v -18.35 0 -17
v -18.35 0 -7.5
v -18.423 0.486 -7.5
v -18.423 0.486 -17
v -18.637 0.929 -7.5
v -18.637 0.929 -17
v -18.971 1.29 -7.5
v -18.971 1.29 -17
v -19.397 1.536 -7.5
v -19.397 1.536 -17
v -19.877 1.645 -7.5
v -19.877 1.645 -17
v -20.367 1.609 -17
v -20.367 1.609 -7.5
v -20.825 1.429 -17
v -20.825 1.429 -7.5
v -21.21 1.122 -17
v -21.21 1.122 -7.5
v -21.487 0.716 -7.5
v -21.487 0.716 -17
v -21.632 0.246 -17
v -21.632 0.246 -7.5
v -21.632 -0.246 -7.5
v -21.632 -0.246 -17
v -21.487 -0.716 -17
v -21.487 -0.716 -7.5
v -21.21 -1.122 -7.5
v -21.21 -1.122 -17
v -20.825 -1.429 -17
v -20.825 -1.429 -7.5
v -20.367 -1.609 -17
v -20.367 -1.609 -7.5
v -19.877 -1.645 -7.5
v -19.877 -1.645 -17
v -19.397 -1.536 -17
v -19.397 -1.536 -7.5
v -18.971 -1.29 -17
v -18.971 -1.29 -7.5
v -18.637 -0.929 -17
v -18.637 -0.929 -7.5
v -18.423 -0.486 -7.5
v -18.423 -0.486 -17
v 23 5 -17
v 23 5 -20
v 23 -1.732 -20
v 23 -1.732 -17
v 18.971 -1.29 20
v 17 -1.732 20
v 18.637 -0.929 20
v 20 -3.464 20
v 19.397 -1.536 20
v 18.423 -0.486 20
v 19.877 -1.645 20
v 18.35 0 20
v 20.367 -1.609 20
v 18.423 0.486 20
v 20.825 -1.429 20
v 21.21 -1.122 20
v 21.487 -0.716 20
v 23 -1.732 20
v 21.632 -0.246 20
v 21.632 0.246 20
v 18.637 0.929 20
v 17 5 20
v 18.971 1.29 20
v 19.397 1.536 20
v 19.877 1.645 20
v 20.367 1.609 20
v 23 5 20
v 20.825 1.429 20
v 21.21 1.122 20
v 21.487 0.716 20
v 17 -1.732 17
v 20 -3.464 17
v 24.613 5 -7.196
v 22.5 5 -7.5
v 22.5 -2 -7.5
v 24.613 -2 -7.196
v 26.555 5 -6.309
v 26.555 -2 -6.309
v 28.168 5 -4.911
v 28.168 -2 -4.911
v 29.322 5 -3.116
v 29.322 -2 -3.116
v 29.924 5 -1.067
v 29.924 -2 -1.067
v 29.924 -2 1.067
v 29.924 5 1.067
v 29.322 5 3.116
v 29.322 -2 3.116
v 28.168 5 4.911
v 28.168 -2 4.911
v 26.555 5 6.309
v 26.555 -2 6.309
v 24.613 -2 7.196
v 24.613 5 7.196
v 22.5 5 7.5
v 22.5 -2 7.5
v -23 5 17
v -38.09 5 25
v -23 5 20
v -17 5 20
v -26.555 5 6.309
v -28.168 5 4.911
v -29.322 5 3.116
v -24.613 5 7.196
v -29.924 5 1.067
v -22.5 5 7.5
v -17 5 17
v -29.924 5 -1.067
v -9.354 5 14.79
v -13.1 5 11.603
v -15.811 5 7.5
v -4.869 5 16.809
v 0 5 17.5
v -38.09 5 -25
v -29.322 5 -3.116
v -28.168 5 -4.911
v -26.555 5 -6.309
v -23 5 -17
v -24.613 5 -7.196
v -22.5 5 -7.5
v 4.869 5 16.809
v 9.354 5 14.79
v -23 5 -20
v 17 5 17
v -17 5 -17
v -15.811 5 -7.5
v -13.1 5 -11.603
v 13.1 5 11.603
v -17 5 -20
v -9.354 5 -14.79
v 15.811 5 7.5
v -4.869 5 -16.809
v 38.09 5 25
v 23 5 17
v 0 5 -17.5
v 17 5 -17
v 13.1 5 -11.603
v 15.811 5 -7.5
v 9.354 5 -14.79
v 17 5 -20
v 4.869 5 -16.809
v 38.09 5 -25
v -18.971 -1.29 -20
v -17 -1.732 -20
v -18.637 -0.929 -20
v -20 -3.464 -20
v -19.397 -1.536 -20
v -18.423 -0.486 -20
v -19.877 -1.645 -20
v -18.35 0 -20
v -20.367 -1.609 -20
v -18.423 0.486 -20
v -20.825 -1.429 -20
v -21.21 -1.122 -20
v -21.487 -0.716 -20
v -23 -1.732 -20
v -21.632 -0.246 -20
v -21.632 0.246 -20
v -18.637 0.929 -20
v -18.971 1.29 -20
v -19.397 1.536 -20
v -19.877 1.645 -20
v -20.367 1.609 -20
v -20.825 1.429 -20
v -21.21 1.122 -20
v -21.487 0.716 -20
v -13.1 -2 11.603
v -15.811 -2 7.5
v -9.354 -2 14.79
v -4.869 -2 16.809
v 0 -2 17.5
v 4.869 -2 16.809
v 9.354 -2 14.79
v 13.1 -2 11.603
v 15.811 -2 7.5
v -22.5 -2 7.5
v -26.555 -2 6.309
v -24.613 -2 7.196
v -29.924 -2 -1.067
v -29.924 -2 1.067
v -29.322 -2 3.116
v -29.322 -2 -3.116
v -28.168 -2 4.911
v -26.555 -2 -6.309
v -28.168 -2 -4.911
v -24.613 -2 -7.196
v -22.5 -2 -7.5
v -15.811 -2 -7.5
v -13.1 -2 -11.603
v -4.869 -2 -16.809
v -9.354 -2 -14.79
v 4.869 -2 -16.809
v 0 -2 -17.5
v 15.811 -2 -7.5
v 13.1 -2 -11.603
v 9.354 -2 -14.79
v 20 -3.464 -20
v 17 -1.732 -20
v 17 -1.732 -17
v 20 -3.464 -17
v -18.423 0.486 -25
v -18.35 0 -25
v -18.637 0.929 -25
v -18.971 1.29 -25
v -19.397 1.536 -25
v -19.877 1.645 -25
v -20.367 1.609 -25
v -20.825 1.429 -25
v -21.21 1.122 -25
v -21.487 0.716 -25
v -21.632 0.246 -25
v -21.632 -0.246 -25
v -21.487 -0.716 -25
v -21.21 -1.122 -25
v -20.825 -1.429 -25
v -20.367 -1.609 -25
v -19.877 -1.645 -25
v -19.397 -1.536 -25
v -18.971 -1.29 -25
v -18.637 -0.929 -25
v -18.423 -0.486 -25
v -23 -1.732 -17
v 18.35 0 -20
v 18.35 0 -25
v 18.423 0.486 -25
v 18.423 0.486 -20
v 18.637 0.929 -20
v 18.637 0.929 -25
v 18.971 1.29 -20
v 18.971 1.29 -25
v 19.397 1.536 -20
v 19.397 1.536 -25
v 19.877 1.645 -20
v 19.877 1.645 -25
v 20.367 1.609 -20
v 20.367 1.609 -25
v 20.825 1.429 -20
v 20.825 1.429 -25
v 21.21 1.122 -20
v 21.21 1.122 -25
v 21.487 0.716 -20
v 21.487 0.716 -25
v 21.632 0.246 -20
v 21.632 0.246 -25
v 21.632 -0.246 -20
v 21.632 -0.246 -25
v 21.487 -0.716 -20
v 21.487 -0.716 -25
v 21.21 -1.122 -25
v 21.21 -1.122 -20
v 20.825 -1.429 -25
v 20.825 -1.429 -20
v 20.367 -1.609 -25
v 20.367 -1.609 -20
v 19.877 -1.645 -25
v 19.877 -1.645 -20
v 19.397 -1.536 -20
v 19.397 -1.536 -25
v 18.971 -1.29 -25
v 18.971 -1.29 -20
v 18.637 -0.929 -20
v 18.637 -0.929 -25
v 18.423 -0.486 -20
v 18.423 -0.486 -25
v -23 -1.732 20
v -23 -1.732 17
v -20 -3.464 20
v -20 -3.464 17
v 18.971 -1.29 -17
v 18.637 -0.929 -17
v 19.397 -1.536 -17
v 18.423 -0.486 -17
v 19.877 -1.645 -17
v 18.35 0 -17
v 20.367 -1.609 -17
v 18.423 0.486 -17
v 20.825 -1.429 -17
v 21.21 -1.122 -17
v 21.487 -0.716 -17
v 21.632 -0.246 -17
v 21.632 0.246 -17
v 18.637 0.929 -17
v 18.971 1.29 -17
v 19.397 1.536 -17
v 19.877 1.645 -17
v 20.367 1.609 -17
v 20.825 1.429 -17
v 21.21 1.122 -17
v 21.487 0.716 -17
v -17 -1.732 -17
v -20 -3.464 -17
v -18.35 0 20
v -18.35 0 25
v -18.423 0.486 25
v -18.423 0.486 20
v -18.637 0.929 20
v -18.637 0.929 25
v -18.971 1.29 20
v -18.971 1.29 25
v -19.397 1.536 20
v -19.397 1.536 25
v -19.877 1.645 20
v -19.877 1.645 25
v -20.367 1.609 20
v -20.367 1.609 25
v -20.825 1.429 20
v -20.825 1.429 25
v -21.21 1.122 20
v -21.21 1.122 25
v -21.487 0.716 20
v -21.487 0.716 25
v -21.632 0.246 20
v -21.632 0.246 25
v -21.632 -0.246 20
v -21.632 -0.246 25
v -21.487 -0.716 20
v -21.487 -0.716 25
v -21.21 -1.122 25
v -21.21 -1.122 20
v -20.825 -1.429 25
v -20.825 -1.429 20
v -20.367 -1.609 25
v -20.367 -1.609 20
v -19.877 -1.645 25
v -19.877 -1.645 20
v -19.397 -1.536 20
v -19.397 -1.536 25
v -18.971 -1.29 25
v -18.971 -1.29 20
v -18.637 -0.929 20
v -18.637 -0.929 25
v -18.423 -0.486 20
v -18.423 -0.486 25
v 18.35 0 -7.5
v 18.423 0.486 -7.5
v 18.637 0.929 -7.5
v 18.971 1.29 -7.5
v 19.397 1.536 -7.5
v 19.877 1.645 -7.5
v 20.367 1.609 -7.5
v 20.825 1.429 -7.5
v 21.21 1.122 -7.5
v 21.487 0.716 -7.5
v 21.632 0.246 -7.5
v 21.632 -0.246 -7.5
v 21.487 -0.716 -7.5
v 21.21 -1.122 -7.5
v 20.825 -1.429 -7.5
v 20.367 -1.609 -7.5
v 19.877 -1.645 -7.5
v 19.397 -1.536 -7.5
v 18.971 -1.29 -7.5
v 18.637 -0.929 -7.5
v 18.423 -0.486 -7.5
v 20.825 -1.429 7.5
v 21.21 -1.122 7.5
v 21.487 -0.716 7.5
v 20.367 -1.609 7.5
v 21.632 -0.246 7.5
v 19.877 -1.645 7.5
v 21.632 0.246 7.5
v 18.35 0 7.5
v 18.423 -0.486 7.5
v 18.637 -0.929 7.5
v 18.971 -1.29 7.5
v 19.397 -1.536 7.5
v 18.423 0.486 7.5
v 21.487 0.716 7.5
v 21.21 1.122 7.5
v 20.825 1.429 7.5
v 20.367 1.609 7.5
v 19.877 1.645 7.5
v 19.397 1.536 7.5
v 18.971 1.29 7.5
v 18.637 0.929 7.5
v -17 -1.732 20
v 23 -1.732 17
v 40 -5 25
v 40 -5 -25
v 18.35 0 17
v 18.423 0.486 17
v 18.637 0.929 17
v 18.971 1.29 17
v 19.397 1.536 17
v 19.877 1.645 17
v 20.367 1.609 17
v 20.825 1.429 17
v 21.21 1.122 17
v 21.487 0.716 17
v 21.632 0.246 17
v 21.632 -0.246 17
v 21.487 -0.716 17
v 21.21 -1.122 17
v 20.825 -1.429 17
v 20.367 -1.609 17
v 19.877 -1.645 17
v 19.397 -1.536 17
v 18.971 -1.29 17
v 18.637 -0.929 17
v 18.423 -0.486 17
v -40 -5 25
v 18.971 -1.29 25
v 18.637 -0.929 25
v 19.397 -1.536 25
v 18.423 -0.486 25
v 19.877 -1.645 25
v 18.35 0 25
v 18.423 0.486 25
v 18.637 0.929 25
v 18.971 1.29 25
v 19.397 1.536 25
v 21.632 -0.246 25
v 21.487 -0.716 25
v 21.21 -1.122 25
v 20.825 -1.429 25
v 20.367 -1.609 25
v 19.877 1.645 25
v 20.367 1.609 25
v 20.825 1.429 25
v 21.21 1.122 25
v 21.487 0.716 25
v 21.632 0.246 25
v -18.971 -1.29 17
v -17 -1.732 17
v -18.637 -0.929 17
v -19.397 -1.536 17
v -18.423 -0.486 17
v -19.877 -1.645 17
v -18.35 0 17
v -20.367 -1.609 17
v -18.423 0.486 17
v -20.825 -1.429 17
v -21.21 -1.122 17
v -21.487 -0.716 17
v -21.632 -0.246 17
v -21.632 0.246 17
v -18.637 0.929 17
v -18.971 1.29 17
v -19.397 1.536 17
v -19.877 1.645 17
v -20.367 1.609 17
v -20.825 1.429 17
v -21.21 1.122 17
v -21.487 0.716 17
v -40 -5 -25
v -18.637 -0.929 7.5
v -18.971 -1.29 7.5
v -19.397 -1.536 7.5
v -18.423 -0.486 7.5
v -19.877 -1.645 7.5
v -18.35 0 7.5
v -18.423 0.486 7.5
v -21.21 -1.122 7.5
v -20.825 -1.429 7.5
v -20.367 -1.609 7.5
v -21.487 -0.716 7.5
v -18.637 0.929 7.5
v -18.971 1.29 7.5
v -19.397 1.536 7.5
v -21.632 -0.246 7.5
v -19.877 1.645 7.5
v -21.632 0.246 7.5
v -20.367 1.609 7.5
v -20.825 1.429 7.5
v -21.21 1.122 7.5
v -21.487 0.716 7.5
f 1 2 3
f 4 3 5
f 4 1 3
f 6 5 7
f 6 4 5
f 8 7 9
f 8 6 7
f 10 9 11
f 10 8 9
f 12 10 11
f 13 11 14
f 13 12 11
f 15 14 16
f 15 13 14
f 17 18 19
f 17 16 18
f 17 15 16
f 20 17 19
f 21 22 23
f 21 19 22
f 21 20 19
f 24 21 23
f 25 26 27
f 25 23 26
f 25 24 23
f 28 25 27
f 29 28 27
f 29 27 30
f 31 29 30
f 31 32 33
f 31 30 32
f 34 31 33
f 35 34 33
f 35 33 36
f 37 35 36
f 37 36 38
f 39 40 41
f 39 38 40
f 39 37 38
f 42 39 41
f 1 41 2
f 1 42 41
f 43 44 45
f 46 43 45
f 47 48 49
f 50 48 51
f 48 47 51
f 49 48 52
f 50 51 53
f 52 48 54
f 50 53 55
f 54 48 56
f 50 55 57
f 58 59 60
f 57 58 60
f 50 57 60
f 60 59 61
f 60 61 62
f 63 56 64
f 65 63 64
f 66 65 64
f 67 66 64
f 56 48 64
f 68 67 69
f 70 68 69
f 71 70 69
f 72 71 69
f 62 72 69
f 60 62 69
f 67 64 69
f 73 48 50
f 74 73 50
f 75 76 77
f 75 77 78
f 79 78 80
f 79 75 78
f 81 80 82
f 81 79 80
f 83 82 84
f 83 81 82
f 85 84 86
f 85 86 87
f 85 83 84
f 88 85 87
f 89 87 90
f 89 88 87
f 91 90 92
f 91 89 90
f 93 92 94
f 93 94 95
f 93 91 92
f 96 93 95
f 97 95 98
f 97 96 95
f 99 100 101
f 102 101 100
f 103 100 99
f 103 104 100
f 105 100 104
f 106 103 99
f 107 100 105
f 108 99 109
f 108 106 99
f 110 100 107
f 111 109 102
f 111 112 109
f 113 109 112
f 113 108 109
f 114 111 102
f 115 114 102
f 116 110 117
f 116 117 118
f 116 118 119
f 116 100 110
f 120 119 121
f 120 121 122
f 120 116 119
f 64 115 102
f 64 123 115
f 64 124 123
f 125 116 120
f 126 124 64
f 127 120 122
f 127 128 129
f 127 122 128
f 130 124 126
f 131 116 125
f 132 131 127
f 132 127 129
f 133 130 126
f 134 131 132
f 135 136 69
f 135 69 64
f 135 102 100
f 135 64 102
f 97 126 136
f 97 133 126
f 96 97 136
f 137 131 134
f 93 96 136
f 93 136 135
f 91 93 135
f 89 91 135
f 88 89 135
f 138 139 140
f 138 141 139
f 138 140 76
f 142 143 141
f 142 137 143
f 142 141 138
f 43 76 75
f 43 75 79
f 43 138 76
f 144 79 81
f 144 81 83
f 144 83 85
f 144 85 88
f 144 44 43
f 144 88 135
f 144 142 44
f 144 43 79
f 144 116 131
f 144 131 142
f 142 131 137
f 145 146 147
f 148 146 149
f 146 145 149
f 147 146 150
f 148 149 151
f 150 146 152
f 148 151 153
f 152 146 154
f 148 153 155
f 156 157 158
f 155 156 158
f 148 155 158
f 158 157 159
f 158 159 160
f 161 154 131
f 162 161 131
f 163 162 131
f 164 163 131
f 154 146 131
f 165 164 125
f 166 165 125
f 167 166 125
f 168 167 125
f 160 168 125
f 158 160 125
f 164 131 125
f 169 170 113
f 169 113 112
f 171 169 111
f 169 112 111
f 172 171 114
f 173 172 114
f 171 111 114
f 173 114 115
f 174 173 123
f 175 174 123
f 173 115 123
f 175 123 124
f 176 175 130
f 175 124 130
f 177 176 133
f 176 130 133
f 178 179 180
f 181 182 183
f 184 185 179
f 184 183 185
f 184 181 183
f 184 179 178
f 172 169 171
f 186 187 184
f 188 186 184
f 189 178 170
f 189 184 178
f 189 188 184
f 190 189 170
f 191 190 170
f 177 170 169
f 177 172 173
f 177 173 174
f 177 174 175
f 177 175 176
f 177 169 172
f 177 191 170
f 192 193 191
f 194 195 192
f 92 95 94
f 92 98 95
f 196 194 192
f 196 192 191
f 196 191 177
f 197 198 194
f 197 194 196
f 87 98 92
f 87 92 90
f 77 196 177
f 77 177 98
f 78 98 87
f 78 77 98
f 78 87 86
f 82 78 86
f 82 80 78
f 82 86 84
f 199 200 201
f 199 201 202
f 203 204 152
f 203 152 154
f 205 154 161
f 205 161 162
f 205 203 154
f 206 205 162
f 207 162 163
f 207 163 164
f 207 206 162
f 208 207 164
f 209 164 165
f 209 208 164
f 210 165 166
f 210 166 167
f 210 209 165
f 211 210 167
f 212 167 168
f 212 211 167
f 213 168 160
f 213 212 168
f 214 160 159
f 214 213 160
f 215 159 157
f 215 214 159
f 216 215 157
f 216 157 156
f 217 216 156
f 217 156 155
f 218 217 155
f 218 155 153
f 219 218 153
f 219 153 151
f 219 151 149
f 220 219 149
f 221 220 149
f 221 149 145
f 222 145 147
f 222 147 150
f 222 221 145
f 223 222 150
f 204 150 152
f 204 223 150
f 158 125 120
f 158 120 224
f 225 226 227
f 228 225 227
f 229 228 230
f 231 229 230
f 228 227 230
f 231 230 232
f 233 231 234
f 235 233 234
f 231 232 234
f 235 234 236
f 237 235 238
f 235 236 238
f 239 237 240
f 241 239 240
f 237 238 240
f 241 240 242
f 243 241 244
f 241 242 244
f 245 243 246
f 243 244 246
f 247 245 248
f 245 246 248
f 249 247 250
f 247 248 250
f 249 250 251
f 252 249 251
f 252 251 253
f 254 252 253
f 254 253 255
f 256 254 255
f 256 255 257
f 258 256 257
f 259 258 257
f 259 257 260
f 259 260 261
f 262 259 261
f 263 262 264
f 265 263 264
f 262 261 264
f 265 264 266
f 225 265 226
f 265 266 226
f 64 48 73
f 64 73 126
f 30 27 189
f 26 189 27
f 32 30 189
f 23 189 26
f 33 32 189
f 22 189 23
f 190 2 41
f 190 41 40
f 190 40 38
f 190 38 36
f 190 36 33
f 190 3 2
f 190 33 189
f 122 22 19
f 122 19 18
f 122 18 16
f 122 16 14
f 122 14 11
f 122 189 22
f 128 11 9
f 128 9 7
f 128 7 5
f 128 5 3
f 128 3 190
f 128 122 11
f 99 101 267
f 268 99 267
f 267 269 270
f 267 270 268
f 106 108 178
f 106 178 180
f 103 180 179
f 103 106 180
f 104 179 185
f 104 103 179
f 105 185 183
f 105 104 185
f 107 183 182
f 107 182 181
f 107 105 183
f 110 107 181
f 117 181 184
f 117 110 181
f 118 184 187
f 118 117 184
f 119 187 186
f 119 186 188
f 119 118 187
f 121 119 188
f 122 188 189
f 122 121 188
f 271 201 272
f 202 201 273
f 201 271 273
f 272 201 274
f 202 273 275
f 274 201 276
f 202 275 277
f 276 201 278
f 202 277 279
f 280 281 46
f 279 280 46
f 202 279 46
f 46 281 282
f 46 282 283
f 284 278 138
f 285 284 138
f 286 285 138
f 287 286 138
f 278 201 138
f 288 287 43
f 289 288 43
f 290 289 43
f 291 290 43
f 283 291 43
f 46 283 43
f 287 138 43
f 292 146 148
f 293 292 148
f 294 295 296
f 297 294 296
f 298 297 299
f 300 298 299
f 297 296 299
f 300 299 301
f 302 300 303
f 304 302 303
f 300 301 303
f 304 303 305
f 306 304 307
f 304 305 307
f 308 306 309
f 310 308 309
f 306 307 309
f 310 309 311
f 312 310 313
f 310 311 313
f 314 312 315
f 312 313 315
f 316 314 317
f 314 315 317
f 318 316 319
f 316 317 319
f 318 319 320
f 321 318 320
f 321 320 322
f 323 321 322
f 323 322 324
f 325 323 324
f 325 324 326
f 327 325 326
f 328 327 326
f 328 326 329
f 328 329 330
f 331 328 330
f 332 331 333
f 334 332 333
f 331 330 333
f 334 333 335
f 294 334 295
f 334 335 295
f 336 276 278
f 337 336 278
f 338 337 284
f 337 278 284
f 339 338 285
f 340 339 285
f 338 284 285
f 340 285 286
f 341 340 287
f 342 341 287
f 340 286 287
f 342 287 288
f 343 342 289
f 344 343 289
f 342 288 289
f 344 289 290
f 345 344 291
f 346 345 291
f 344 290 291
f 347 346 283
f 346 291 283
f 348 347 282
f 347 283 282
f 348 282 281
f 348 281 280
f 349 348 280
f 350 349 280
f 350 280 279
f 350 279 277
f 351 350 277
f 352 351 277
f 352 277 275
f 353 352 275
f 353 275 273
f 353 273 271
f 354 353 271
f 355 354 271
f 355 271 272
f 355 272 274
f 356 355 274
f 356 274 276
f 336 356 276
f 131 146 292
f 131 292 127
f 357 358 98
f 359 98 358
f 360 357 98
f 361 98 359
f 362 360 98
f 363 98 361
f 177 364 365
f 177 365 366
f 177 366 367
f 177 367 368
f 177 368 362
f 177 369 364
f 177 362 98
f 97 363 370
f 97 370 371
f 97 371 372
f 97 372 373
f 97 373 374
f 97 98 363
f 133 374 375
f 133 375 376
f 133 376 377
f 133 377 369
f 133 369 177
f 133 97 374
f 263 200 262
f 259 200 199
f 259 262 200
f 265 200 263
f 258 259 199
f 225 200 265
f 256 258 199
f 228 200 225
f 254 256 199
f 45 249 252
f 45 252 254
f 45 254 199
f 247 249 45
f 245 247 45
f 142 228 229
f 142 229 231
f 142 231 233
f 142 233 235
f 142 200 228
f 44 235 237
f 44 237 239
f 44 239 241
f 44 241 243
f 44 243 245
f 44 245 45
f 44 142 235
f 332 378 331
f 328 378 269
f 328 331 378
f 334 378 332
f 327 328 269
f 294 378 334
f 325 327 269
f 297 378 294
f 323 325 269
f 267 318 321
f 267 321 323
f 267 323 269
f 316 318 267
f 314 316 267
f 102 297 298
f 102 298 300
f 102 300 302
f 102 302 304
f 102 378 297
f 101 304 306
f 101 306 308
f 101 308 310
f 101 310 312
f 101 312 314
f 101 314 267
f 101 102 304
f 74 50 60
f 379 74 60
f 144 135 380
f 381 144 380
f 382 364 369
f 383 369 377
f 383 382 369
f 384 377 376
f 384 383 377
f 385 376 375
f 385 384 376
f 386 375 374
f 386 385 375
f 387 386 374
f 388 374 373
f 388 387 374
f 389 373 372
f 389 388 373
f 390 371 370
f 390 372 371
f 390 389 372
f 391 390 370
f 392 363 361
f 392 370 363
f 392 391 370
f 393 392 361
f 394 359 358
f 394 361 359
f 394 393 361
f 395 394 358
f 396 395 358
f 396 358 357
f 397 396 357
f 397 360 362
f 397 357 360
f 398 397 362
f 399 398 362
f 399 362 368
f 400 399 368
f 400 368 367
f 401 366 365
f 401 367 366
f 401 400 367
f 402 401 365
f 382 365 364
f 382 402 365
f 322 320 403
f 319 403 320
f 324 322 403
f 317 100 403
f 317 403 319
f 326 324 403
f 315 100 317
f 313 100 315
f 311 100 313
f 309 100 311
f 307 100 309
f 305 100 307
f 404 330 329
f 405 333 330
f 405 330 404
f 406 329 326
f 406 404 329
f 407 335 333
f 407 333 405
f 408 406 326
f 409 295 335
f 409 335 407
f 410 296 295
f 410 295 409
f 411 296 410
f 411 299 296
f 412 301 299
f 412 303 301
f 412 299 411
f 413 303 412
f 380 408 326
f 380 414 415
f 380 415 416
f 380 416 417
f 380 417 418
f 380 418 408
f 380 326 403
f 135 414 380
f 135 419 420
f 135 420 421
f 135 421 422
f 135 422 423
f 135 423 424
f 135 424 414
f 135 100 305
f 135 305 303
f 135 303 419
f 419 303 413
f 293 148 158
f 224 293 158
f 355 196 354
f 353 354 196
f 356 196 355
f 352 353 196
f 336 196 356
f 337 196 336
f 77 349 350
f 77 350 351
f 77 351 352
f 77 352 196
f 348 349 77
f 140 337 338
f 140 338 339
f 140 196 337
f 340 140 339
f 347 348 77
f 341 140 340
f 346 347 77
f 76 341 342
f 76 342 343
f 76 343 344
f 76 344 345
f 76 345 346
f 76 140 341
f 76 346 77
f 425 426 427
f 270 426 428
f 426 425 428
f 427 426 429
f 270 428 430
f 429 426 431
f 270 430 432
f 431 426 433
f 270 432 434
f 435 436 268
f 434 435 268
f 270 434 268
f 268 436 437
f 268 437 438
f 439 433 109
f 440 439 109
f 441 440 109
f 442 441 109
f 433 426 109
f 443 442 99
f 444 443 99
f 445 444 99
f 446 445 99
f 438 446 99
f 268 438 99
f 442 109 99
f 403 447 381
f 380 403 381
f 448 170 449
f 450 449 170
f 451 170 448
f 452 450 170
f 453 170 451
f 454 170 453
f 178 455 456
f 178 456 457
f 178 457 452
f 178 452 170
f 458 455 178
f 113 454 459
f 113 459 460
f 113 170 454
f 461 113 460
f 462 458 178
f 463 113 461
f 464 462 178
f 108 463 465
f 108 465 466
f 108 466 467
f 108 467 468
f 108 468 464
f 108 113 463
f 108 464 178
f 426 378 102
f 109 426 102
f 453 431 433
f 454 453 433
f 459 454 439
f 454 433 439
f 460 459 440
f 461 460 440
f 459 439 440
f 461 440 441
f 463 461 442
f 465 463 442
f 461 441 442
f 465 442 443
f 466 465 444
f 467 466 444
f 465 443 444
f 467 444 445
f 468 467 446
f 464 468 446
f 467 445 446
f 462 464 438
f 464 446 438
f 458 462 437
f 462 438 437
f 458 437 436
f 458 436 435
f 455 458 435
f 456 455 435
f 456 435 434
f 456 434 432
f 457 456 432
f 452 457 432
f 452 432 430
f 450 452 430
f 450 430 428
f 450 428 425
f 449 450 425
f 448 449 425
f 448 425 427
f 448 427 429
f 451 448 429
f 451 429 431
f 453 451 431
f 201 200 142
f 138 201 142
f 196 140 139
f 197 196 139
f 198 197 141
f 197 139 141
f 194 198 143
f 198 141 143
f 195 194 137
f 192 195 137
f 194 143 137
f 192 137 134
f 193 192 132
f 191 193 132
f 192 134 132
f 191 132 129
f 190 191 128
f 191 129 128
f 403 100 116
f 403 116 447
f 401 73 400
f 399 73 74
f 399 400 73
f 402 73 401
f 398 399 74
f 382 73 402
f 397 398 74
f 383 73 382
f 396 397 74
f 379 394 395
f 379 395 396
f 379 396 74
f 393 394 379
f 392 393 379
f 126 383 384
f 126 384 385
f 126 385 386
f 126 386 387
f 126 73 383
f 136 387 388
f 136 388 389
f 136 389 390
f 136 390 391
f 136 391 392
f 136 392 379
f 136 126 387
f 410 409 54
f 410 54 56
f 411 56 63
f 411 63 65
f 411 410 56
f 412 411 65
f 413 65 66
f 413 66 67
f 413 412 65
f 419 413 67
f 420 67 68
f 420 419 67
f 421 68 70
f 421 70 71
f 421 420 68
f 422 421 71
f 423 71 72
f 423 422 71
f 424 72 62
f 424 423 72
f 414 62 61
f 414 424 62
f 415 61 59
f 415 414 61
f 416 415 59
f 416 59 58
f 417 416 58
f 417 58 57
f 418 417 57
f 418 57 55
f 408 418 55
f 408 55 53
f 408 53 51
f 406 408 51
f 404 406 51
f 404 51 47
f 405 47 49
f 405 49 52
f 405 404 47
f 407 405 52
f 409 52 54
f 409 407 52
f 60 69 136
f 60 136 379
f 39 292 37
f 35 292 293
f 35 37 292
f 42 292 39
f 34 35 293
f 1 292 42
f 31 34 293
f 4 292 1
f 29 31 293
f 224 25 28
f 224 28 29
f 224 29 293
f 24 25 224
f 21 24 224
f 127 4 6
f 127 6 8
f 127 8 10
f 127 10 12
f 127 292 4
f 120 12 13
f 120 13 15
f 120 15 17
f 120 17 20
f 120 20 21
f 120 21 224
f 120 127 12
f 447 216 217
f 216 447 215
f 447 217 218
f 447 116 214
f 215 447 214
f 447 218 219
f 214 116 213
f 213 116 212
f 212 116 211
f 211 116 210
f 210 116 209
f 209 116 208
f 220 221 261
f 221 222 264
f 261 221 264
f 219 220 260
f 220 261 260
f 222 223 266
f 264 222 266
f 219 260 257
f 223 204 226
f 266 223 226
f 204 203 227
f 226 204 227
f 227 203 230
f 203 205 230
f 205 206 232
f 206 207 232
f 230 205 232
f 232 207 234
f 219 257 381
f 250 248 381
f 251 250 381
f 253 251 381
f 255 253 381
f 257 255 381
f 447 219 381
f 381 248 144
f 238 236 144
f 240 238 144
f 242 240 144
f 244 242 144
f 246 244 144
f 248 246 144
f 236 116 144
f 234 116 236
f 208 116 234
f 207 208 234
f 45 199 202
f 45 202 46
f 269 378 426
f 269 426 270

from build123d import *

# Parameters (mm, degrees)
SKETCH1_W               = 80
SKETCH1_H               = 50
BOSS_EXTRUDE1_DEPTH     = 5
SKETCH3_R               = 1.65
CUT_EXTRUDE1_DEPTH      = 5
CUT_EXTRUDE2_DEPTH      = 3
SKETCH5_R               = 1.65
CUT_EXTRUDE3_DEPTH      = 10
MIRROR2_COPY_1_SKETCH_R = 1.65
MIRROR2_COPY_1_DEPTH    = 5
MIRROR2_COPY_2_DEPTH    = 3
MIRROR2_COPY_3_SKETCH_R = 1.65
MIRROR2_COPY_3_DEPTH    = 10
CUT_EXTRUDE4_DEPTH      = 51
SKETCH7_R               = 17.5
CUT_EXTRUDE5_DEPTH      = 7
CUT_EXTRUDE6_DEPTH      = 7


with BuildPart() as part:
    # Sketch1 → Boss-Extrude1 (new body, symmetric)
    with BuildSketch(Plane(origin=(0, 0, 0), x_dir=(1, 0, 0), z_dir=(0, 1, 0))):
        Rectangle(SKETCH1_W, SKETCH1_H)
    extrude(amount=BOSS_EXTRUDE1_DEPTH, both=True)

    # Sketch3 → Cut-Extrude1 (cut)
    with BuildSketch(Plane.XY.offset(25)):
        with Locations((-20, 0)):
            Circle(SKETCH3_R)
    cut_extrude1 = extrude(amount=-CUT_EXTRUDE1_DEPTH, mode=Mode.SUBTRACT)

    # Sketch4 → Cut-Extrude2 (cut)
    with BuildSketch(Plane.XY.offset(20)):
        Polygon((-23, 1.732050808), (-23, 5.757498214), (-17, 5.757498214), (-17, 1.732050808), (-17, -1.732050808), (-20, -3.464101615), (-23, -1.732050808), align=None)
    cut_extrude2 = extrude(amount=-CUT_EXTRUDE2_DEPTH, mode=Mode.SUBTRACT)

    # Sketch5 → Cut-Extrude3 (cut)
    with BuildSketch(Plane.XY.offset(17)):
        with Locations((-20, 0)):
            Circle(SKETCH5_R)
    cut_extrude3 = extrude(amount=-CUT_EXTRUDE3_DEPTH, mode=Mode.SUBTRACT)

    # Mirror1: Cut-Extrude1, Cut-Extrude2, Cut-Extrude3 across plane
    add(cut_extrude1.mirror(Plane(origin=(0, 0, 0), x_dir=(0, 0, 1), z_dir=(1, 0, 0))), mode=Mode.SUBTRACT)
    add(cut_extrude2.mirror(Plane(origin=(0, 0, 0), x_dir=(0, 0, 1), z_dir=(1, 0, 0))), mode=Mode.SUBTRACT)
    add(cut_extrude3.mirror(Plane(origin=(0, 0, 0), x_dir=(0, 0, 1), z_dir=(1, 0, 0))), mode=Mode.SUBTRACT)

    # Mirror2: Cut-Extrude1, Cut-Extrude2, Cut-Extrude3 across plane
    add(cut_extrude1.mirror(Plane.XY), mode=Mode.SUBTRACT)
    add(cut_extrude2.mirror(Plane.XY), mode=Mode.SUBTRACT)
    add(cut_extrude3.mirror(Plane.XY), mode=Mode.SUBTRACT)

    # Mirror2 copy 1 sketch → Mirror2 copy 1 (cut)
    with BuildSketch(Plane(origin=(0, 0, -25), x_dir=(-1, 0, 0), z_dir=(0, 0, -1))):
        with Locations((-20, 0)):
            Circle(MIRROR2_COPY_1_SKETCH_R)
    extrude(amount=-MIRROR2_COPY_1_DEPTH, mode=Mode.SUBTRACT)

    # Mirror2 copy 2 sketch → Mirror2 copy 2 (cut)
    with BuildSketch(Plane(origin=(0, 0, -20), x_dir=(-1, 0, 0), z_dir=(0, 0, -1))):
        Polygon((-23, 1.732050808), (-23, 5.757498214), (-17, 5.757498214), (-17, 1.732050808), (-17, -1.732050808), (-20, -3.464101615), (-23, -1.732050808), align=None)
    extrude(amount=-MIRROR2_COPY_2_DEPTH, mode=Mode.SUBTRACT)

    # Mirror2 copy 3 sketch → Mirror2 copy 3 (cut)
    with BuildSketch(Plane(origin=(0, 0, -17), x_dir=(-1, 0, 0), z_dir=(0, 0, -1))):
        with Locations((-20, 0)):
            Circle(MIRROR2_COPY_3_SKETCH_R)
    extrude(amount=-MIRROR2_COPY_3_DEPTH, mode=Mode.SUBTRACT)

    # Sketch6 → Cut-Extrude4 (cut, through all)
    with BuildSketch(Plane.XY.offset(25)):
        Polygon((-40, 5), (-38.09, 5), (-40, -5), align=None)
    cut_extrude4 = extrude(amount=-CUT_EXTRUDE4_DEPTH, mode=Mode.SUBTRACT)

    # Mirror3: Cut-Extrude4 across plane
    add(cut_extrude4.mirror(Plane(origin=(0, 0, 0), x_dir=(0, 0, 1), z_dir=(1, 0, 0))), mode=Mode.SUBTRACT)

    # Sketch7 → Cut-Extrude5 (cut)
    with BuildSketch(Plane(origin=(0, 5, 0), x_dir=(1, 0, 0), z_dir=(0, 1, 0))):
        Circle(SKETCH7_R)
    extrude(amount=-CUT_EXTRUDE5_DEPTH, mode=Mode.SUBTRACT)

    # Sketch8 → Cut-Extrude6 (cut)
    with BuildSketch(Plane(origin=(0, 5, 0), x_dir=(1, 0, 0), z_dir=(0, 1, 0))):
        with BuildLine():
            Line((22.5, -7.5), (-22.5, -7.5))
            ThreePointArc((-22.5, -7.5), (-30, 0), (-22.5, 7.5))
            Line((-22.5, 7.5), (22.5, 7.5))
            ThreePointArc((22.5, 7.5), (30, 0), (22.5, -7.5))
        make_face()
    extrude(amount=-CUT_EXTRUDE6_DEPTH, mode=Mode.SUBTRACT)


solid = part.part
